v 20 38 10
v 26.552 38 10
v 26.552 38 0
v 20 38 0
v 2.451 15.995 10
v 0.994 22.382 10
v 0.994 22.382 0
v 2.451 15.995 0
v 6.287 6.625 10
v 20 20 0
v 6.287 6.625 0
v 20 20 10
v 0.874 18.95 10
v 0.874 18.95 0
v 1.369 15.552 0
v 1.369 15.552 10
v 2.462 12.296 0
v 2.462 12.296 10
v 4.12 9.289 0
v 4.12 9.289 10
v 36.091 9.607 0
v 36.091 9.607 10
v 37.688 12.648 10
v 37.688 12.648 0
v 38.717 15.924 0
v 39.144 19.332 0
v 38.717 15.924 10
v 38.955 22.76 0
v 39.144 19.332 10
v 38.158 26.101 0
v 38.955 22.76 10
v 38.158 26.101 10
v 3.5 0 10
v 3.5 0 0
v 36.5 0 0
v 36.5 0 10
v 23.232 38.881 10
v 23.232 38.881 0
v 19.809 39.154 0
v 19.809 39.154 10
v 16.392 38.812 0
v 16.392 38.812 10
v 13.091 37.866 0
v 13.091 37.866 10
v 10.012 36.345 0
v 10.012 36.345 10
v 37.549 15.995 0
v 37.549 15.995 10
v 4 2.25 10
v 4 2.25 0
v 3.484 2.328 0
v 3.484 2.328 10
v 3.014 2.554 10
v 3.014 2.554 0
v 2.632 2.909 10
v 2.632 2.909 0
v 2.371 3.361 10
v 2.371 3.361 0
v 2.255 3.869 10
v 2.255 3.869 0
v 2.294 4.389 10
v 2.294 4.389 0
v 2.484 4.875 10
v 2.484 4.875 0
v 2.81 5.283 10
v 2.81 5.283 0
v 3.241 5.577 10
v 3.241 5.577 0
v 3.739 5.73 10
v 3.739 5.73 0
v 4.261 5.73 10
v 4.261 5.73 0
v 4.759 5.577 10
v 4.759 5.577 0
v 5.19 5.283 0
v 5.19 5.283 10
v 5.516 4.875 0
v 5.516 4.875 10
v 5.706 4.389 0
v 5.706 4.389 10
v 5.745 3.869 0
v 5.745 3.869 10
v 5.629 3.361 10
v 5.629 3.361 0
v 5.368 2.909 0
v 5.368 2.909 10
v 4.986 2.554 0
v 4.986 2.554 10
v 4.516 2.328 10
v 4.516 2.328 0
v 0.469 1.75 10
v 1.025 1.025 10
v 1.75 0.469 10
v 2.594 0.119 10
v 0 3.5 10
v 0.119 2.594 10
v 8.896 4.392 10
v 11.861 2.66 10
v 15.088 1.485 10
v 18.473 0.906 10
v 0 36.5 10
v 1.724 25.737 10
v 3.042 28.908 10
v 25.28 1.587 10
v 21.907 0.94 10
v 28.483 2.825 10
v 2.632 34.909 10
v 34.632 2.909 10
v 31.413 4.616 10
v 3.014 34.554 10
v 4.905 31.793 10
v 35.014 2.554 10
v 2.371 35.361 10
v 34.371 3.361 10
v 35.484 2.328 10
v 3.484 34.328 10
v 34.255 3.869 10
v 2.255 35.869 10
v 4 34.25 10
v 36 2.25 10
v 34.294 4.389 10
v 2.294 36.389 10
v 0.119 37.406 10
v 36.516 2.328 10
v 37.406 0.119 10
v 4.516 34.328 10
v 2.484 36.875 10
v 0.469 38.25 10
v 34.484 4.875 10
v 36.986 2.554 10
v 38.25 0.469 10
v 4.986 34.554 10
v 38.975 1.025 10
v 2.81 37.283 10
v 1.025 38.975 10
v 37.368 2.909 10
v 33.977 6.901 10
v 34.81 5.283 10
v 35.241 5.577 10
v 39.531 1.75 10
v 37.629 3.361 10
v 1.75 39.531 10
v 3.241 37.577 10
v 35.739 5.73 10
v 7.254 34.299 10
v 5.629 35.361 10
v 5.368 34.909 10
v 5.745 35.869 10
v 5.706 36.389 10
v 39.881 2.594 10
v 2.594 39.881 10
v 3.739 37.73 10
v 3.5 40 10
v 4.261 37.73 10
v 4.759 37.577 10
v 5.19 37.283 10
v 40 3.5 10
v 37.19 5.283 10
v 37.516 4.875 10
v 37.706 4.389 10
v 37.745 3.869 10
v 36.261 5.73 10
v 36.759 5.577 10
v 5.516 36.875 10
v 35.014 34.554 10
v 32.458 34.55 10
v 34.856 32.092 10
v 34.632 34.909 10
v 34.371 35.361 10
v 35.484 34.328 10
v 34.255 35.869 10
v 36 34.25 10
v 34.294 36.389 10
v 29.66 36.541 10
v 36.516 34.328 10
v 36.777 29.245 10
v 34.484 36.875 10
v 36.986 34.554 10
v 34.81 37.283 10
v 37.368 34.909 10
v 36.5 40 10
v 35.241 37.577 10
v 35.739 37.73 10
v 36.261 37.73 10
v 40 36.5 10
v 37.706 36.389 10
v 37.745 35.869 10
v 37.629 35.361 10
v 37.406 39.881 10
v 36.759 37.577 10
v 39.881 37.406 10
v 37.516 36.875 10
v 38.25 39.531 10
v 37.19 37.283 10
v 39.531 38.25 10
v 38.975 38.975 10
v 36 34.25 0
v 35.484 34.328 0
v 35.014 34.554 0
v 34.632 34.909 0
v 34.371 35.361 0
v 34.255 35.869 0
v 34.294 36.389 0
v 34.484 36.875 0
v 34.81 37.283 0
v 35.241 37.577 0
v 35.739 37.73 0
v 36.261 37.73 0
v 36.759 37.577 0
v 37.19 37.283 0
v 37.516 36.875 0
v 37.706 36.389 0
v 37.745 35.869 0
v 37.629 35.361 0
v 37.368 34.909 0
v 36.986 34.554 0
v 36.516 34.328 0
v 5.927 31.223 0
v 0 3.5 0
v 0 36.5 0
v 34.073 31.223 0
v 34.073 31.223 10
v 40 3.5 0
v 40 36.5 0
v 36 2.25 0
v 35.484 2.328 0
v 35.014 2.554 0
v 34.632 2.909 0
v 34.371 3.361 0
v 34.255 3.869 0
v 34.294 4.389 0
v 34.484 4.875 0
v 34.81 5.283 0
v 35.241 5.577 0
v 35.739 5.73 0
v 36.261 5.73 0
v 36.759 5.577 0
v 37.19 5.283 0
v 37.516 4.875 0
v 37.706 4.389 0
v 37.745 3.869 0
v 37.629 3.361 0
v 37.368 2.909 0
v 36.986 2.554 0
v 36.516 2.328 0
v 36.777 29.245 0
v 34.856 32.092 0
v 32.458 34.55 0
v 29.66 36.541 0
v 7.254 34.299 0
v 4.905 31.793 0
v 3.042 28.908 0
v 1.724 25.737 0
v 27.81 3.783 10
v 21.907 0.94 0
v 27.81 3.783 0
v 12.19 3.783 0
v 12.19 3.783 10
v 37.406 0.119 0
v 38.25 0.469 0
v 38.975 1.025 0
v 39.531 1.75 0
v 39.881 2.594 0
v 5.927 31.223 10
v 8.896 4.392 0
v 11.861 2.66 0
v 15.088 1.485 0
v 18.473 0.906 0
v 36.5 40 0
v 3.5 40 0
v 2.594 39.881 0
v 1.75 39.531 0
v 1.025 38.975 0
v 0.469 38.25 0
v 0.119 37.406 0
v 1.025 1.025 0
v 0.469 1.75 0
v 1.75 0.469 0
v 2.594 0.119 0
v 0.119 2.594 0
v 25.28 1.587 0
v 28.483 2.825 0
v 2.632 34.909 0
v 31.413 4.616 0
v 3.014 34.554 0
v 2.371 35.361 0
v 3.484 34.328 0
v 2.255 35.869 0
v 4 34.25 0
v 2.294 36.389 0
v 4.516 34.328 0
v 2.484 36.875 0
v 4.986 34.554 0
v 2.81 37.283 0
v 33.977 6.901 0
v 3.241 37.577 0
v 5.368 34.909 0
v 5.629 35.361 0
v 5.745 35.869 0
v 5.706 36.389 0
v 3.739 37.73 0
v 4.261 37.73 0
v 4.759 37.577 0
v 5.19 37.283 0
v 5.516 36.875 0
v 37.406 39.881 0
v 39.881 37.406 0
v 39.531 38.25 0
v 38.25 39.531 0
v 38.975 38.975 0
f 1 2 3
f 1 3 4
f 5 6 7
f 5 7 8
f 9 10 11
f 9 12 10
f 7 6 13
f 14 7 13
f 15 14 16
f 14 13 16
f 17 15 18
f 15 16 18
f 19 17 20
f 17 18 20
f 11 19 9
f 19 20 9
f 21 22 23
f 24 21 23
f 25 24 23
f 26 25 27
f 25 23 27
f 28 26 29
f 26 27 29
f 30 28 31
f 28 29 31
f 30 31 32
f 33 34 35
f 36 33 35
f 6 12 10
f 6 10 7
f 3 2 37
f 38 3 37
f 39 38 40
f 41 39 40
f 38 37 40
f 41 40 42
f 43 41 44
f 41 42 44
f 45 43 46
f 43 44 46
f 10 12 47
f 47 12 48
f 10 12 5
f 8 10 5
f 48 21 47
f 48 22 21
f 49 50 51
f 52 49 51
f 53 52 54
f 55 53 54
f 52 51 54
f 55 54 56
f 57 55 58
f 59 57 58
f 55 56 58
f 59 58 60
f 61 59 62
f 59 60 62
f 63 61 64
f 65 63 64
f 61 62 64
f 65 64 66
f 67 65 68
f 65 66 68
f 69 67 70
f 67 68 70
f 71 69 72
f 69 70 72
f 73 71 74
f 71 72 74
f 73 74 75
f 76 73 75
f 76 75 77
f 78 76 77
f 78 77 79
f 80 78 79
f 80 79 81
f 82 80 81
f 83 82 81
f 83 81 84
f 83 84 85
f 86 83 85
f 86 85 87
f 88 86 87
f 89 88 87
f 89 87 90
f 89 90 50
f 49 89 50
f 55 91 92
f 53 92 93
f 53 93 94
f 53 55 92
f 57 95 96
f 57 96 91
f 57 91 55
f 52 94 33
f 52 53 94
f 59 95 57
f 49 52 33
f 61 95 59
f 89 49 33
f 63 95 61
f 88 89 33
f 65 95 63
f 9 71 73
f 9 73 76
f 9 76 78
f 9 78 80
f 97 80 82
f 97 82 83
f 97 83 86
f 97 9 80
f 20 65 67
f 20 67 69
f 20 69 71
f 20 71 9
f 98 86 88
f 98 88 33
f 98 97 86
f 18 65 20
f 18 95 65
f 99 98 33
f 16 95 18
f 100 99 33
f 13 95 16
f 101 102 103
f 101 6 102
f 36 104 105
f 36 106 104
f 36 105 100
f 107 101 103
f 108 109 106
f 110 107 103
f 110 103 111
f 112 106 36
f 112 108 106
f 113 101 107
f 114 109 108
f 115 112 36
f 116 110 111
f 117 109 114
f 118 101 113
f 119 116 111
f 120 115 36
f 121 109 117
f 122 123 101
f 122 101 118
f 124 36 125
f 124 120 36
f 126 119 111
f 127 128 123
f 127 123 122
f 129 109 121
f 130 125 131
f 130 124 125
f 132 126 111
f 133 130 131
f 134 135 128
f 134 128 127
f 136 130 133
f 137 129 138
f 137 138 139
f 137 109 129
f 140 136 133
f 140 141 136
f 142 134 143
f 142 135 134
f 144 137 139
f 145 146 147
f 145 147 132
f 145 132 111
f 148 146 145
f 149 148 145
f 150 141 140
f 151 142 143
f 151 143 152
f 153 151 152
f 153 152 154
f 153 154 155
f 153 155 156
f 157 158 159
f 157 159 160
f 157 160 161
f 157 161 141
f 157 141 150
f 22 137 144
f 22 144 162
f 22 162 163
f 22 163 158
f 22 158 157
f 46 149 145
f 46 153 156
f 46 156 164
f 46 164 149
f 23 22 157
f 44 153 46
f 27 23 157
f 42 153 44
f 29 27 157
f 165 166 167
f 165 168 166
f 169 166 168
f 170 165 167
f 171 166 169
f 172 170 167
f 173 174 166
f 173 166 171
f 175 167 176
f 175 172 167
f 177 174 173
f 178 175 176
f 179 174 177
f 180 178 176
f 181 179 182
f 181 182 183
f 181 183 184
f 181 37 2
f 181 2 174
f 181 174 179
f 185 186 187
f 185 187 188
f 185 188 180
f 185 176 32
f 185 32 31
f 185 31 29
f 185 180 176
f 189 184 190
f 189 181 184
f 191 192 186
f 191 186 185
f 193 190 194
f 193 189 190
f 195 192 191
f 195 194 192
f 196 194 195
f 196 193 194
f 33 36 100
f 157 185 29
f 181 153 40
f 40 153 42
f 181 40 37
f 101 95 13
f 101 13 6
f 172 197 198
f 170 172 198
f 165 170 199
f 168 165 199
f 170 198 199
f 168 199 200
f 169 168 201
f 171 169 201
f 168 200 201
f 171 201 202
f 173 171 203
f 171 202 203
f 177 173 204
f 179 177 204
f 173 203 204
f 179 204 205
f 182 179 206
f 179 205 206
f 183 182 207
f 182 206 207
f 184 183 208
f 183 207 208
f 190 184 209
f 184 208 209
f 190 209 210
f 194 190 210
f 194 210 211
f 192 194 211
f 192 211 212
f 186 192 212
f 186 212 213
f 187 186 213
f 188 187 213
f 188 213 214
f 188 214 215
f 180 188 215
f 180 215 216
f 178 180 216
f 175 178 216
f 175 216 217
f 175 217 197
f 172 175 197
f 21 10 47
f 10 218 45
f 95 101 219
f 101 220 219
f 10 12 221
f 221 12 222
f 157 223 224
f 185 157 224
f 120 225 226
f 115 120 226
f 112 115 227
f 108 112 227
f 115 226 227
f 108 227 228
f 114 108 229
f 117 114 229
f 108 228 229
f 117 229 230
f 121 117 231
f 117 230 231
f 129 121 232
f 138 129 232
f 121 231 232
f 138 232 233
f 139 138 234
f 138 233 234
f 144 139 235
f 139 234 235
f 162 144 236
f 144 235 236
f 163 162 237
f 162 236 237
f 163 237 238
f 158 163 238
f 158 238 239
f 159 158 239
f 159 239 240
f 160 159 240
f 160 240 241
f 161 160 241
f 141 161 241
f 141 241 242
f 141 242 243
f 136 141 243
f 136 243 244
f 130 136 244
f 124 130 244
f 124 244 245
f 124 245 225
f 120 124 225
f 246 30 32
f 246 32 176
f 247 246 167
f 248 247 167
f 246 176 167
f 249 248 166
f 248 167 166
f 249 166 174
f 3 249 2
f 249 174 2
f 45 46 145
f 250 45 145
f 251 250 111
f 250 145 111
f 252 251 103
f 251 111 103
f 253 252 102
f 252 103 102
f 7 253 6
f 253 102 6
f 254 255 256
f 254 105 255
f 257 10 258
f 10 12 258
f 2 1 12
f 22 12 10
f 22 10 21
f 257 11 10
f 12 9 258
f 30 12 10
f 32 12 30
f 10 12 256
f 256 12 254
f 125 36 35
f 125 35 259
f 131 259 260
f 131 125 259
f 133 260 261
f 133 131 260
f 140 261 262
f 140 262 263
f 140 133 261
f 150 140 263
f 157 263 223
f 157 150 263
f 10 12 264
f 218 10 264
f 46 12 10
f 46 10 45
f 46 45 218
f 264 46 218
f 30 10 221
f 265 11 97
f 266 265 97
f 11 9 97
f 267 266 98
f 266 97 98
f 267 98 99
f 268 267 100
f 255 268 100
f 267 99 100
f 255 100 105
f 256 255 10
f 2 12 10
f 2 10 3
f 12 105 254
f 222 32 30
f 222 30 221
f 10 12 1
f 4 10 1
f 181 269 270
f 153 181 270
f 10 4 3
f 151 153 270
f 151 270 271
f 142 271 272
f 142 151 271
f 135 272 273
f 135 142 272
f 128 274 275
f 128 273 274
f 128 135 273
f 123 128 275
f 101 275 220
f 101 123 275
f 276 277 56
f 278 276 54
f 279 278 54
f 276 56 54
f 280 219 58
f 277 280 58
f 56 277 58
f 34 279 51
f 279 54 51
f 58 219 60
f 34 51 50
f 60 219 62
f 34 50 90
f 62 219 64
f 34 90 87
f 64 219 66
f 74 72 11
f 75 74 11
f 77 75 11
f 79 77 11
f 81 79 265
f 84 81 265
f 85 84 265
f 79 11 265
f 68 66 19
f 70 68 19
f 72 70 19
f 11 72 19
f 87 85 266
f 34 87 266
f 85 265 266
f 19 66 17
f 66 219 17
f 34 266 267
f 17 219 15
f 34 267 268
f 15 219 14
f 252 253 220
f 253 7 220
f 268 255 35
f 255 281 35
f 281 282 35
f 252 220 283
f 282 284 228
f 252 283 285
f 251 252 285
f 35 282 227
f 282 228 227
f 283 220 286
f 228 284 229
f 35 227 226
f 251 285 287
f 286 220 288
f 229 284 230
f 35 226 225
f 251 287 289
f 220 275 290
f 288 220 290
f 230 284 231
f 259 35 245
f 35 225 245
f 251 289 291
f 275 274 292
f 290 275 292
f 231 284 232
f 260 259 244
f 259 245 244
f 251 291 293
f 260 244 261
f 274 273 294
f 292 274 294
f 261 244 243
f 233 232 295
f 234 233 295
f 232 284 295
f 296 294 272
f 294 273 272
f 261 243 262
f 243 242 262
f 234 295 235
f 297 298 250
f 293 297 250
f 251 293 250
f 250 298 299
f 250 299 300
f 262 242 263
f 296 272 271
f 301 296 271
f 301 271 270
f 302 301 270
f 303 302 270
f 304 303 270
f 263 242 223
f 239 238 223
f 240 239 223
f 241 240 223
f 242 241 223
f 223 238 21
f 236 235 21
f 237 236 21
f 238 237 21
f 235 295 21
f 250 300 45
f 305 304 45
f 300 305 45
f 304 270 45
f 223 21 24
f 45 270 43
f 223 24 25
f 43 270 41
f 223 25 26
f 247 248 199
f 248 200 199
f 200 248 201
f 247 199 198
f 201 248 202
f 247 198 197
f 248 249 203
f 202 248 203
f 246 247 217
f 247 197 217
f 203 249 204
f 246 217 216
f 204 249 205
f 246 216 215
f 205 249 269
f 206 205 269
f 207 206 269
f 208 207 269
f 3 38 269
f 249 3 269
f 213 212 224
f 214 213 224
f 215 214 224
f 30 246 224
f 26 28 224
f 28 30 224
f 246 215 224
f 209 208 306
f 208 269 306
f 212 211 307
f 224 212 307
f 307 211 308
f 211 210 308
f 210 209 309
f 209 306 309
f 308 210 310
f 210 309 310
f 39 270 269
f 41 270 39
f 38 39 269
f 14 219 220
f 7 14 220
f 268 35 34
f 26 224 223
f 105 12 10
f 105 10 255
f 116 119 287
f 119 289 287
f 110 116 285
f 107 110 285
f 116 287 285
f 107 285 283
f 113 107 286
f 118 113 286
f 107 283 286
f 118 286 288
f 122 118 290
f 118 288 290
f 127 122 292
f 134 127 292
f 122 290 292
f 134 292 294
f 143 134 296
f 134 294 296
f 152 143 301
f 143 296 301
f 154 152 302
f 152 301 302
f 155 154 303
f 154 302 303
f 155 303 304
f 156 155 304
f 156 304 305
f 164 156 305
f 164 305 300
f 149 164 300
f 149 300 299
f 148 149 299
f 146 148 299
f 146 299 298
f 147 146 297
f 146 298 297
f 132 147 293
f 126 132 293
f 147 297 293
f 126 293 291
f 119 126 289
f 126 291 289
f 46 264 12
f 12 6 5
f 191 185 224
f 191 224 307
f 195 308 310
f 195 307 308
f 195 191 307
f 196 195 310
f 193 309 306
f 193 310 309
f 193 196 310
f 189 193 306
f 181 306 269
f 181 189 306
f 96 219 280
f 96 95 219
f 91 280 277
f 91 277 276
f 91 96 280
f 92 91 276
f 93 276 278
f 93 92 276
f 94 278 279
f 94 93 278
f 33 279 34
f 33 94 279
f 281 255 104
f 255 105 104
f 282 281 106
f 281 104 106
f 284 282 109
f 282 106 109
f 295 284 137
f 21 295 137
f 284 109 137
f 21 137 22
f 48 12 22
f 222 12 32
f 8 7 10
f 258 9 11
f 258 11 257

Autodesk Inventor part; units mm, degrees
ref_plane "YZ Plane" through (0, 0, 0) normal (1, 0, 0) x (0, 1, 0)
ref_plane "XZ Plane" through (0, 0, 0) normal (0, 1, 0) x (-1, 0, 0)
ref_plane "XY Plane" through (0, 0, 0) normal (0, 0, 1) x (1, 0, 0)
sketch "Sketch1" plane through (0, 0, 0) normal (0, 0, 1) x (1, 0, 0)
  line L0 (0, 0) -> (40, 0)
  line L1 (40, 0) -> (40, 40)
  line L2 (40, 40) -> (0, 40)
  line L3 (0, 40) -> (0, 0)
  dimension "d0" = 40
  dimension "d1" = 40
extrude "Extrusion1" add sketch "Sketch1" along normal blind 10
hole "Hole1" at (4, 36, 10) direction (0, 0, -1) diameter 3.5 end through all
hole "Hole2" at (4, 4, 10) direction (0, 0, -1) diameter 3.5 end through all
hole "Hole3" at (36, 4, 10) direction (0, 0, -1) diameter 3.5 end through all
hole "Hole4" at (36, 36, 10) direction (0, 0, -1) diameter 3.5 end through all
fillet "Fillet1" radius 3.5 4 edges at (40, 0, 5) (0, 0, 5) (0, 40, 5) (40, 40, 5)
sketch "Sketch2" plane through (0, 0, 10) normal (0, 0, 1) x (1, 0, 0)
  line L0 (36.5, 40) -> (3.5, 40) projected
  line L1 (0, 36.5) -> (0, 3.5) projected
  line L2 (3.5, 0) -> (36.5, 0) projected
  line L3 (40, 3.5) -> (40, 36.5) projected
  line L4 (20, 40) -> (20, 0) construction
  line L5 (0, 20) -> (40, 20) construction
  line L6 (20, 20) -> (20, 38)
  line L7 (20, 20) -> (26.5515, 38)
  line L8 (26.5515, 38) -> (20, 38)
  line L9 (20, 20) -> (5.927, 31.2228)
  line L10 (20, 20) -> (10.0118, 36.345)
  line L11 (10.0118, 36.345) -> (5.927, 31.2228)
  line L12 (20, 20) -> (2.4513, 15.9946)
  line L13 (20, 20) -> (0.9935, 22.3818)
  line L14 (0.9935, 22.3818) -> (2.4513, 15.9946)
  line L15 (20, 20) -> (12.1901, 3.7826)
  line L16 (20, 20) -> (6.2874, 6.6251)
  line L17 (6.2874, 6.6251) -> (12.1901, 3.7826)
  line L18 (20, 20) -> (27.8099, 3.7826)
  line L19 (20, 20) -> (21.9072, 0.94)
  line L20 (21.9072, 0.94) -> (27.8099, 3.7826)
  line L21 (20, 20) -> (37.5487, 15.9946)
  line L22 (20, 20) -> (36.0909, 9.6074)
  line L23 (36.0909, 9.6074) -> (37.5487, 15.9946)
  line L24 (20, 20) -> (34.073, 31.2228)
  line L25 (20, 20) -> (38.1577, 26.1007)
  line L26 (38.1577, 26.1007) -> (34.073, 31.2228)
  circle A0 centre (20, 20) radius 19.1552
  point P0 (0, 0)
  dimension "d41" = 18
  dimension "d42" = 20
  dimension "d45" = 360
extrude "Extrusion2" cut sketch "Sketch2" against normal blind 10 contours L10 A0 L8 L6 | L13 A0 L11 L9 | L16 A0 L14 L12 | L19 A0 L17 L15 | L22 A0 L20 L18 | L25 A0 L23 L21 | L7 A0 L26 L24
properties part number "Fan40mm" material "ABS Plastic"
